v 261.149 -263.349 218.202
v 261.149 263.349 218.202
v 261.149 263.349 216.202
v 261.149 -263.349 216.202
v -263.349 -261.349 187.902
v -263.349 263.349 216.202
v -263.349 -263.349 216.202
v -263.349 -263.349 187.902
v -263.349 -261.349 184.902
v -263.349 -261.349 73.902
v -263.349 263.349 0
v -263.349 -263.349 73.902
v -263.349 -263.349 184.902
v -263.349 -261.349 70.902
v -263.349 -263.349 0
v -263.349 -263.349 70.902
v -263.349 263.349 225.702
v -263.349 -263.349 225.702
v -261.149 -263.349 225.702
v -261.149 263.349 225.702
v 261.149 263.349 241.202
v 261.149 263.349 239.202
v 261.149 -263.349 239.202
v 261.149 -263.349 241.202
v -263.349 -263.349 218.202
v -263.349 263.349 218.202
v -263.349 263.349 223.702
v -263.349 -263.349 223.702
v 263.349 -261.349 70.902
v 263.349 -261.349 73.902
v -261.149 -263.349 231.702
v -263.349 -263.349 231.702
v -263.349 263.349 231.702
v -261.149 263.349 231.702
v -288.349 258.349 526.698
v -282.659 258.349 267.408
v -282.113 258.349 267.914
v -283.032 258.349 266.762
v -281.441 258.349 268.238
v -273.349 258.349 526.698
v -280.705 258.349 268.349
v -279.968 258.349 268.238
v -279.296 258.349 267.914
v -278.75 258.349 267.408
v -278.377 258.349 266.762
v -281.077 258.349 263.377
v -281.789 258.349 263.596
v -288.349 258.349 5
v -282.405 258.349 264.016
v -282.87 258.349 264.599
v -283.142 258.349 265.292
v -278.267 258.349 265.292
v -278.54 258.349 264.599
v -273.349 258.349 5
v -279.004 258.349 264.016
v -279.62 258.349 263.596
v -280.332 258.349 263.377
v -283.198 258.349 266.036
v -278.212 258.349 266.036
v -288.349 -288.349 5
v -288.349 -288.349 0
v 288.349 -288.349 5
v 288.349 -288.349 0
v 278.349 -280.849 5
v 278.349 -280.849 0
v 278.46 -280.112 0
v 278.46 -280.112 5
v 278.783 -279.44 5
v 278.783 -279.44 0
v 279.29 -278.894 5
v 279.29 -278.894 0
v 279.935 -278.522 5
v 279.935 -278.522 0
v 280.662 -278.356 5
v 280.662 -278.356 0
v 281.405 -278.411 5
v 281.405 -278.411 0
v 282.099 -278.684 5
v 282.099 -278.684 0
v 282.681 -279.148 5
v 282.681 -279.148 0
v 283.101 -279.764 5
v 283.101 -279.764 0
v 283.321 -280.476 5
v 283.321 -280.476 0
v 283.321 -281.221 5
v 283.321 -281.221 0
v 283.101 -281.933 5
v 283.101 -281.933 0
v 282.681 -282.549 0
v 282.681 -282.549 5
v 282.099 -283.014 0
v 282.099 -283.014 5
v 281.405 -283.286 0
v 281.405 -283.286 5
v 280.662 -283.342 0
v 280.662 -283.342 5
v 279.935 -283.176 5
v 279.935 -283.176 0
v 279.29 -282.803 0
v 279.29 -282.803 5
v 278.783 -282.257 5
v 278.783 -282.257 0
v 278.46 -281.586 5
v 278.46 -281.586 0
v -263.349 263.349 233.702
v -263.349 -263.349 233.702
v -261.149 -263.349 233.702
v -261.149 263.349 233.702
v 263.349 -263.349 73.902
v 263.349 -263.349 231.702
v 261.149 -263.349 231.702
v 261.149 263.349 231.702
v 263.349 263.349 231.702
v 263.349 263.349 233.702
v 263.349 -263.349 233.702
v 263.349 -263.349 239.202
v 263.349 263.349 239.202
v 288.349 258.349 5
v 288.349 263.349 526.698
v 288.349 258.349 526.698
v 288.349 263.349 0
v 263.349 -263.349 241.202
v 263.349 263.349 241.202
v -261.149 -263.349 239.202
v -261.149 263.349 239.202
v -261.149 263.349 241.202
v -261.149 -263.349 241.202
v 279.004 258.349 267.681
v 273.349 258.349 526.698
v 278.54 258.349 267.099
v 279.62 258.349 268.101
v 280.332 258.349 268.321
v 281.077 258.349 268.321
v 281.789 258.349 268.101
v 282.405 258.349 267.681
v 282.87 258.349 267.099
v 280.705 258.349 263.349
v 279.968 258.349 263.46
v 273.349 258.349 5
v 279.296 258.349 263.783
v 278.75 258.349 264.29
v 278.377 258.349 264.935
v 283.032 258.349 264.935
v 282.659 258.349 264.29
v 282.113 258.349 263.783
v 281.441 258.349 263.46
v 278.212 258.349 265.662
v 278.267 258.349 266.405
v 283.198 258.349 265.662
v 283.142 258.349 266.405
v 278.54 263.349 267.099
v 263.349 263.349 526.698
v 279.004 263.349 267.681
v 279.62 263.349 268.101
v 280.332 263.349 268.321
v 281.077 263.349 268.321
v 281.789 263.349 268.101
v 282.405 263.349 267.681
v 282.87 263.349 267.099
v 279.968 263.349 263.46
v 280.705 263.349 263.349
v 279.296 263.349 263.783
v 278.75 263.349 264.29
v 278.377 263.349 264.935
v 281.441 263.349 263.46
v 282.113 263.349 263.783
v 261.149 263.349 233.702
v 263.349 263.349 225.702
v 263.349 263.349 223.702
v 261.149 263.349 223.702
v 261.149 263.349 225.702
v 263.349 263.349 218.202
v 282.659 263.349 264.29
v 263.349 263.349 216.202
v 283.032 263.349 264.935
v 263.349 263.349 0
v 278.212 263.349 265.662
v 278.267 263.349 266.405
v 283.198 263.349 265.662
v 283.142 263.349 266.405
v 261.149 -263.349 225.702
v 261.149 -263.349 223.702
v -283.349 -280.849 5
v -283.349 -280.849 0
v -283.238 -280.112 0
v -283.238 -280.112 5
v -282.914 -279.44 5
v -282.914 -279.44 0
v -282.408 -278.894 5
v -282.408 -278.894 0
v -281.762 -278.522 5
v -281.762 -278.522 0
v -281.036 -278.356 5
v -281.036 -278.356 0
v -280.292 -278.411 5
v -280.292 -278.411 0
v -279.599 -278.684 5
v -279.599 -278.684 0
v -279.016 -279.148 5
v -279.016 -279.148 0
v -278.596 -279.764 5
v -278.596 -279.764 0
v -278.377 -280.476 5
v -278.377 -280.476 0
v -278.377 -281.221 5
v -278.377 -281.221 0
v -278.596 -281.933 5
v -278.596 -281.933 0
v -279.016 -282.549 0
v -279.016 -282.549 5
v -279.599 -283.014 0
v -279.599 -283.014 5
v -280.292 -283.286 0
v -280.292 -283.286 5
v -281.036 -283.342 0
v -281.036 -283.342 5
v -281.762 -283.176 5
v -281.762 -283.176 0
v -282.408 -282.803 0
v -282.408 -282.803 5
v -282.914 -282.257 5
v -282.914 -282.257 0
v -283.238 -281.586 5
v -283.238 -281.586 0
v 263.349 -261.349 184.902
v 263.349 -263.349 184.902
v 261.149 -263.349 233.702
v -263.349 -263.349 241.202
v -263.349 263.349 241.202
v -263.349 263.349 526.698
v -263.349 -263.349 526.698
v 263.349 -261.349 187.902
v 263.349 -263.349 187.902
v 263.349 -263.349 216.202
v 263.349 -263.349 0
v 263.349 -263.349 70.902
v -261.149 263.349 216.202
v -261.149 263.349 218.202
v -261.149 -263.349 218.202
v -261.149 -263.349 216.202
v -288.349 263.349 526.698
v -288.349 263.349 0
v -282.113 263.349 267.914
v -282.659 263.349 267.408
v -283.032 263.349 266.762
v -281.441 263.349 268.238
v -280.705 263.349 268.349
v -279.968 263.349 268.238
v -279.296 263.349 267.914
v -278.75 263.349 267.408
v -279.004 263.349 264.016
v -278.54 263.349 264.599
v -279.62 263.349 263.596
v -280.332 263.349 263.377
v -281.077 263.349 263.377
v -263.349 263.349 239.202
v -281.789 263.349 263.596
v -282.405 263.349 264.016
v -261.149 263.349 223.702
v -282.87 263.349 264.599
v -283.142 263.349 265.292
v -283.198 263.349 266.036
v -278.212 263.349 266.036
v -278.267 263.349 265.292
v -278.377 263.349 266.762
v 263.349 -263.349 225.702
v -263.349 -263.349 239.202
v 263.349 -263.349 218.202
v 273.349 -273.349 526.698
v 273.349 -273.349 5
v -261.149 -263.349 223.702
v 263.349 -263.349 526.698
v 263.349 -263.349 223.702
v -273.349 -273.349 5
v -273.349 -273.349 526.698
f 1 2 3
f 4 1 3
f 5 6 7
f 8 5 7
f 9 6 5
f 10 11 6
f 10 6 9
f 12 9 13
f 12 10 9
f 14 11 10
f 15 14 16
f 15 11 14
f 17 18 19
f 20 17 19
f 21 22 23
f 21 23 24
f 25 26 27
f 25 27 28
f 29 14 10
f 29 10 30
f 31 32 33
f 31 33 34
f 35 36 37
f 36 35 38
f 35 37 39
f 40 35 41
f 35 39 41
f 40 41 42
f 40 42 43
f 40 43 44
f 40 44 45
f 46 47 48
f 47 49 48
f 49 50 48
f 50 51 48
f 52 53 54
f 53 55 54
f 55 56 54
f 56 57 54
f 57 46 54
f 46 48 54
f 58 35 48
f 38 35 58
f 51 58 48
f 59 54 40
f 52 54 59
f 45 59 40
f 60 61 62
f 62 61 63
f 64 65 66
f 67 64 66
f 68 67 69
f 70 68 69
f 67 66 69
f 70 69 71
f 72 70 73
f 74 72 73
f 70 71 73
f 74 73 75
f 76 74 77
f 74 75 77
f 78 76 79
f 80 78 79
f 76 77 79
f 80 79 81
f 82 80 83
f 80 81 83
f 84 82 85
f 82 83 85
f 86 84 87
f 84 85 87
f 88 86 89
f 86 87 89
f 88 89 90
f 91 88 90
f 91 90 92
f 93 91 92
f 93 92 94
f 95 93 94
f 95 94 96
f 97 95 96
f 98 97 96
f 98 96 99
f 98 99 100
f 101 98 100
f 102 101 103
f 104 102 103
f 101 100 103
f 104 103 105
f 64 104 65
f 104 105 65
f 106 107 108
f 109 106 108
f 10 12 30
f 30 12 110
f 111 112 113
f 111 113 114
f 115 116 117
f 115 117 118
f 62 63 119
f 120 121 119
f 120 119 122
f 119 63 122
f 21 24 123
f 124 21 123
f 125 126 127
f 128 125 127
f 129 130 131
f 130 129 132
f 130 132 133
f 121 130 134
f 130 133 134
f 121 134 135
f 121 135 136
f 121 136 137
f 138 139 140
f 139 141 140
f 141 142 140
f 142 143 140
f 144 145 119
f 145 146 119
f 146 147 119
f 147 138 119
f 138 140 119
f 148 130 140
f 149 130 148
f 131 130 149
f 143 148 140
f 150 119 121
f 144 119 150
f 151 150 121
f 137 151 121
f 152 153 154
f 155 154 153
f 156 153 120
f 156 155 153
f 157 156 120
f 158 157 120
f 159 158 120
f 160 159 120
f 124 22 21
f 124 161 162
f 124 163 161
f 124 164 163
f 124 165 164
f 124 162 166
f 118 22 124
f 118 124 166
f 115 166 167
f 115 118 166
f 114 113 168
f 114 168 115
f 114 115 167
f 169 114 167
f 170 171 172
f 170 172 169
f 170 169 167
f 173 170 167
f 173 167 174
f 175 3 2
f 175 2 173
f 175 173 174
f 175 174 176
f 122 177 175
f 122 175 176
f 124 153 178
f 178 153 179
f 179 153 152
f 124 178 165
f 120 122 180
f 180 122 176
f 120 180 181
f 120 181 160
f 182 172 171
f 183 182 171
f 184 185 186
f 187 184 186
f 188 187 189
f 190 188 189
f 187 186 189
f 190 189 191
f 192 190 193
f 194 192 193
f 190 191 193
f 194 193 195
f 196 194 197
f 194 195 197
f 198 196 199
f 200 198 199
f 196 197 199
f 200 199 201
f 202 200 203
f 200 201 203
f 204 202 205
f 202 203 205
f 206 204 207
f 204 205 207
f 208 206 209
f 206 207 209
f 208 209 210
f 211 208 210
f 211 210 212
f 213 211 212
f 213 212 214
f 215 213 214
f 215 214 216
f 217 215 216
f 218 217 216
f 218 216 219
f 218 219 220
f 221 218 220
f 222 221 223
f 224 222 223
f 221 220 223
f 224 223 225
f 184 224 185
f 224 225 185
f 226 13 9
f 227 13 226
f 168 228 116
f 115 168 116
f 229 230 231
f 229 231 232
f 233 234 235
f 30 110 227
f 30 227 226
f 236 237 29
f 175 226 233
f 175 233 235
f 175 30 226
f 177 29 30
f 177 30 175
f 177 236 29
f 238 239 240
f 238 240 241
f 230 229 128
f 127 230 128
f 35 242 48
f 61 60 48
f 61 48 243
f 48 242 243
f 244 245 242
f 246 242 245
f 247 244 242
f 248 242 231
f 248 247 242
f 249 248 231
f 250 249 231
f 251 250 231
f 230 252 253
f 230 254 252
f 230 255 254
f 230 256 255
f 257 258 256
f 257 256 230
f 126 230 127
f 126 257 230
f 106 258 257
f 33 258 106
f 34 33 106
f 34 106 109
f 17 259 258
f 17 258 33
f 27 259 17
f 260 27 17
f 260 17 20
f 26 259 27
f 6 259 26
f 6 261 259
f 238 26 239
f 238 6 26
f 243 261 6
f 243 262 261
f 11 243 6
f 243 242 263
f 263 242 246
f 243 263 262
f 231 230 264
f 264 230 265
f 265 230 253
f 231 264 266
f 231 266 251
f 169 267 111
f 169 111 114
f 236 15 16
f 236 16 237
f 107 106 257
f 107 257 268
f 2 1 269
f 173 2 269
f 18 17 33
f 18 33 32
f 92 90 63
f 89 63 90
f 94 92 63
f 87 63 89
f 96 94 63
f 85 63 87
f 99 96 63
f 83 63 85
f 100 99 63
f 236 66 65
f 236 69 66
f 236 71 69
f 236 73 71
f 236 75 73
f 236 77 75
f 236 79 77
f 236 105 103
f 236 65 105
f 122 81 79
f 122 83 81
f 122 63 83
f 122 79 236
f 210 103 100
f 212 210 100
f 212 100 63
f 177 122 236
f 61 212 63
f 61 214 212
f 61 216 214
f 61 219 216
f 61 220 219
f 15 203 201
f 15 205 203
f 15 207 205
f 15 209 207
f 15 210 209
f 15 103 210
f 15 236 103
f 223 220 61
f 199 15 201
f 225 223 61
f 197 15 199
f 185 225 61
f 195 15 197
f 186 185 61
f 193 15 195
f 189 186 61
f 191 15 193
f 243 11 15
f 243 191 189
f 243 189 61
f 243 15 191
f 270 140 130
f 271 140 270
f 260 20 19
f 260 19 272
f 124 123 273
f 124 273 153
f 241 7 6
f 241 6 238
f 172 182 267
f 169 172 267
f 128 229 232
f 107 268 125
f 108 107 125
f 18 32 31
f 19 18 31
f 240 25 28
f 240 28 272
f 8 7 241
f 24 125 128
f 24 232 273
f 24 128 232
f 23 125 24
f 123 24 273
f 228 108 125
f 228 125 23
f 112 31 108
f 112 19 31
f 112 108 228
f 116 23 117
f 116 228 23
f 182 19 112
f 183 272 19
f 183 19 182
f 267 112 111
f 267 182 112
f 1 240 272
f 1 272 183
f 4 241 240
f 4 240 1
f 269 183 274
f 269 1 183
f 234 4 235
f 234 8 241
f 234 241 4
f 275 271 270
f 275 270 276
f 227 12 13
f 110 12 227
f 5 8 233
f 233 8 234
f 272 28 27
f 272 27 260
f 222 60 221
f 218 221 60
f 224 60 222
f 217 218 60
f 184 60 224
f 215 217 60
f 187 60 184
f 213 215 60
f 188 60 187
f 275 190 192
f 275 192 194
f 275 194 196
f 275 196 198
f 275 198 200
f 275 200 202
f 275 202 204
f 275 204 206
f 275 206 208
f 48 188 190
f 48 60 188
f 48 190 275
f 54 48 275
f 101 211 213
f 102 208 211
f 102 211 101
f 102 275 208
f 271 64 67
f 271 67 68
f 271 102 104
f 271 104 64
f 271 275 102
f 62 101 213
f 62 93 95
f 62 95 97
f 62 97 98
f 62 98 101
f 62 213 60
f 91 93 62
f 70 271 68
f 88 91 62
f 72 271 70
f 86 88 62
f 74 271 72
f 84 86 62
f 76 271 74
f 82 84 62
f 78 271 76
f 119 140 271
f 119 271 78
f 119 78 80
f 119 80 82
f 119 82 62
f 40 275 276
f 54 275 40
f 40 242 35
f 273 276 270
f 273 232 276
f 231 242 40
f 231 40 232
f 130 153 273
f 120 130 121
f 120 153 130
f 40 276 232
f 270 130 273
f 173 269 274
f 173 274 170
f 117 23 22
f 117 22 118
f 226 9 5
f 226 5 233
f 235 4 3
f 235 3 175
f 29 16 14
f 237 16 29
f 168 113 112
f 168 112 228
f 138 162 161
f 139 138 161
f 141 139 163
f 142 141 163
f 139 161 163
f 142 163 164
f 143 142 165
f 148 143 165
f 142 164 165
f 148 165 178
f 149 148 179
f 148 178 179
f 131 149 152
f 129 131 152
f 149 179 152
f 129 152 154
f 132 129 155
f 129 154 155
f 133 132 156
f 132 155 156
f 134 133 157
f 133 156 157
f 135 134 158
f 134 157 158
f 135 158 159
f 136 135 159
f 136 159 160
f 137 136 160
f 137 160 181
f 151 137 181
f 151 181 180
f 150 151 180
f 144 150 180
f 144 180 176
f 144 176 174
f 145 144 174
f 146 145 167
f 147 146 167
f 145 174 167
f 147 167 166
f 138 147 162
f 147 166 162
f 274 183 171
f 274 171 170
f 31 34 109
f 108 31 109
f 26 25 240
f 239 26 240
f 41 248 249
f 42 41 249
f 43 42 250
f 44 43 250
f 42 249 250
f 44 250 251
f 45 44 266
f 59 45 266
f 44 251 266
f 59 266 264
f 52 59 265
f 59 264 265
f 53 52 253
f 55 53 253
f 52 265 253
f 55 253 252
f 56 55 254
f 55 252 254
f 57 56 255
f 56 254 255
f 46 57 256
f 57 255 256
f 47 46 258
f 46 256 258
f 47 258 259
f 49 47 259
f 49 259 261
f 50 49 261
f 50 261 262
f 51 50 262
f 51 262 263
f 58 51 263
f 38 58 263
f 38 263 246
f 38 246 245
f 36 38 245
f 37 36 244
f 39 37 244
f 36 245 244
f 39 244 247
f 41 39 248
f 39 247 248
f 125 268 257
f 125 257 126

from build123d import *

# Parameters (mm, degrees)
BOSS_EXTRUDE1_DEPTH = 526.6975777
SKETCH2_W           = 526.6975777
SKETCH2_H           = 3
BOSS_EXTRUDE2_DEPTH = 2
SKETCH3_W           = 2.2
SKETCH3_H           = 2
BOSS_EXTRUDE3_DEPTH = 526.6975777
SKETCH4_R           = 2.5
BOSS_EXTRUDE4_DEPTH = 5
SKETCH5_W           = 15
SKETCH5_H           = 521.6975777
SKETCH5_R           = 2.5
BOSS_EXTRUDE5_DEPTH = 5


with BuildPart() as part:
    # Sketch1 → Boss-Extrude1 (new body)
    with BuildSketch(Plane.XY):
        Polygon((-263.34878885, -263.34878885), (263.34878885, -263.34878885), (263.34878885, 263.34878885), (273.34878885, 263.34878885), (273.34878885, -273.34878885), (-273.34878885, -273.34878885), (-273.34878885, 263.34878885), (-263.34878885, 263.34878885), align=None)
    extrude(amount=BOSS_EXTRUDE1_DEPTH)

    # Sketch2 → Boss-Extrude2 (add)
    with BuildSketch(Plane(origin=(0, -263.34878885, 0), x_dir=(1, 0, 0), z_dir=(0, 1, 0))):
        with Locations((0, -72.401892101)):
            Rectangle(SKETCH2_W, SKETCH2_H)
        with Locations((0, -186.401892101)):
            Rectangle(SKETCH2_W, SKETCH2_H)
    extrude(amount=BOSS_EXTRUDE2_DEPTH)

    # Sketch3 → Boss-Extrude3 (add)
    with BuildSketch(Plane(origin=(0, -263.34878885, 0), x_dir=(1, 0, 0), z_dir=(0, 1, 0))):
        with Locations((-262.24878885, -217.20163133)):
            Rectangle(SKETCH3_W, SKETCH3_H)
        with Locations((-262.24878885, -224.70163133)):
            Rectangle(SKETCH3_W, SKETCH3_H)
        with Locations((262.24878885, -224.70163133)):
            Rectangle(SKETCH3_W, SKETCH3_H)
        with Locations((262.24878885, -217.20163133)):
            Rectangle(SKETCH3_W, SKETCH3_H)
    boss_extrude3 = extrude(amount=BOSS_EXTRUDE3_DEPTH)

    # Mirror1: Boss-Extrude3 across plane
    add(boss_extrude3.mirror(Plane.XY.offset(228.70163133)))

    # Sketch4 → Boss-Extrude4 (add)
    with BuildSketch(Plane(origin=(0, 0, 0), x_dir=(-1, 0, 0), z_dir=(0, 0, -1))):
        Polygon((-263.34878885, 263.34878885), (-263.34878885, -263.34878885), (263.34878885, -263.34878885), (263.34878885, 263.34878885), (288.34878885, 263.34878885), (288.34878885, -288.34878885), (-288.34878885, -288.34878885), (-288.34878885, 263.34878885), align=None)
        with Locations((-280.84878885, -280.84878885)):
            Circle(SKETCH4_R, mode=Mode.SUBTRACT)
        with Locations((280.84878885, -280.84878885)):
            Circle(SKETCH4_R, mode=Mode.SUBTRACT)
    extrude(amount=-BOSS_EXTRUDE4_DEPTH)

    # Sketch5 → Boss-Extrude5 (add)
    # profile 1 of 2: a face of its own
    with BuildSketch(Plane(origin=(0, 263.34878885, 0), x_dir=(1, 0, 0), z_dir=(0, 1, 0))):
        with Locations((-280.84878885, -265.84878885)):
            Rectangle(SKETCH5_W, SKETCH5_H)
        with Locations(Location((-280.704595135, -265.84878885, 0), (0, 0, 270))):
            Circle(SKETCH5_R, mode=Mode.SUBTRACT)
    # profile 2 of 2: a face of its own
    with BuildSketch(Plane(origin=(0, 263.34878885, 0), x_dir=(1, 0, 0), z_dir=(0, 1, 0))):
        with Locations((280.84878885, -265.84878885)):
            Rectangle(SKETCH5_W, SKETCH5_H)
        with Locations(Location((280.704595135, -265.84878885, 0), (0, 0, 90))):
            Circle(SKETCH5_R, mode=Mode.SUBTRACT)
    extrude(amount=-BOSS_EXTRUDE5_DEPTH)


solid = part.part
